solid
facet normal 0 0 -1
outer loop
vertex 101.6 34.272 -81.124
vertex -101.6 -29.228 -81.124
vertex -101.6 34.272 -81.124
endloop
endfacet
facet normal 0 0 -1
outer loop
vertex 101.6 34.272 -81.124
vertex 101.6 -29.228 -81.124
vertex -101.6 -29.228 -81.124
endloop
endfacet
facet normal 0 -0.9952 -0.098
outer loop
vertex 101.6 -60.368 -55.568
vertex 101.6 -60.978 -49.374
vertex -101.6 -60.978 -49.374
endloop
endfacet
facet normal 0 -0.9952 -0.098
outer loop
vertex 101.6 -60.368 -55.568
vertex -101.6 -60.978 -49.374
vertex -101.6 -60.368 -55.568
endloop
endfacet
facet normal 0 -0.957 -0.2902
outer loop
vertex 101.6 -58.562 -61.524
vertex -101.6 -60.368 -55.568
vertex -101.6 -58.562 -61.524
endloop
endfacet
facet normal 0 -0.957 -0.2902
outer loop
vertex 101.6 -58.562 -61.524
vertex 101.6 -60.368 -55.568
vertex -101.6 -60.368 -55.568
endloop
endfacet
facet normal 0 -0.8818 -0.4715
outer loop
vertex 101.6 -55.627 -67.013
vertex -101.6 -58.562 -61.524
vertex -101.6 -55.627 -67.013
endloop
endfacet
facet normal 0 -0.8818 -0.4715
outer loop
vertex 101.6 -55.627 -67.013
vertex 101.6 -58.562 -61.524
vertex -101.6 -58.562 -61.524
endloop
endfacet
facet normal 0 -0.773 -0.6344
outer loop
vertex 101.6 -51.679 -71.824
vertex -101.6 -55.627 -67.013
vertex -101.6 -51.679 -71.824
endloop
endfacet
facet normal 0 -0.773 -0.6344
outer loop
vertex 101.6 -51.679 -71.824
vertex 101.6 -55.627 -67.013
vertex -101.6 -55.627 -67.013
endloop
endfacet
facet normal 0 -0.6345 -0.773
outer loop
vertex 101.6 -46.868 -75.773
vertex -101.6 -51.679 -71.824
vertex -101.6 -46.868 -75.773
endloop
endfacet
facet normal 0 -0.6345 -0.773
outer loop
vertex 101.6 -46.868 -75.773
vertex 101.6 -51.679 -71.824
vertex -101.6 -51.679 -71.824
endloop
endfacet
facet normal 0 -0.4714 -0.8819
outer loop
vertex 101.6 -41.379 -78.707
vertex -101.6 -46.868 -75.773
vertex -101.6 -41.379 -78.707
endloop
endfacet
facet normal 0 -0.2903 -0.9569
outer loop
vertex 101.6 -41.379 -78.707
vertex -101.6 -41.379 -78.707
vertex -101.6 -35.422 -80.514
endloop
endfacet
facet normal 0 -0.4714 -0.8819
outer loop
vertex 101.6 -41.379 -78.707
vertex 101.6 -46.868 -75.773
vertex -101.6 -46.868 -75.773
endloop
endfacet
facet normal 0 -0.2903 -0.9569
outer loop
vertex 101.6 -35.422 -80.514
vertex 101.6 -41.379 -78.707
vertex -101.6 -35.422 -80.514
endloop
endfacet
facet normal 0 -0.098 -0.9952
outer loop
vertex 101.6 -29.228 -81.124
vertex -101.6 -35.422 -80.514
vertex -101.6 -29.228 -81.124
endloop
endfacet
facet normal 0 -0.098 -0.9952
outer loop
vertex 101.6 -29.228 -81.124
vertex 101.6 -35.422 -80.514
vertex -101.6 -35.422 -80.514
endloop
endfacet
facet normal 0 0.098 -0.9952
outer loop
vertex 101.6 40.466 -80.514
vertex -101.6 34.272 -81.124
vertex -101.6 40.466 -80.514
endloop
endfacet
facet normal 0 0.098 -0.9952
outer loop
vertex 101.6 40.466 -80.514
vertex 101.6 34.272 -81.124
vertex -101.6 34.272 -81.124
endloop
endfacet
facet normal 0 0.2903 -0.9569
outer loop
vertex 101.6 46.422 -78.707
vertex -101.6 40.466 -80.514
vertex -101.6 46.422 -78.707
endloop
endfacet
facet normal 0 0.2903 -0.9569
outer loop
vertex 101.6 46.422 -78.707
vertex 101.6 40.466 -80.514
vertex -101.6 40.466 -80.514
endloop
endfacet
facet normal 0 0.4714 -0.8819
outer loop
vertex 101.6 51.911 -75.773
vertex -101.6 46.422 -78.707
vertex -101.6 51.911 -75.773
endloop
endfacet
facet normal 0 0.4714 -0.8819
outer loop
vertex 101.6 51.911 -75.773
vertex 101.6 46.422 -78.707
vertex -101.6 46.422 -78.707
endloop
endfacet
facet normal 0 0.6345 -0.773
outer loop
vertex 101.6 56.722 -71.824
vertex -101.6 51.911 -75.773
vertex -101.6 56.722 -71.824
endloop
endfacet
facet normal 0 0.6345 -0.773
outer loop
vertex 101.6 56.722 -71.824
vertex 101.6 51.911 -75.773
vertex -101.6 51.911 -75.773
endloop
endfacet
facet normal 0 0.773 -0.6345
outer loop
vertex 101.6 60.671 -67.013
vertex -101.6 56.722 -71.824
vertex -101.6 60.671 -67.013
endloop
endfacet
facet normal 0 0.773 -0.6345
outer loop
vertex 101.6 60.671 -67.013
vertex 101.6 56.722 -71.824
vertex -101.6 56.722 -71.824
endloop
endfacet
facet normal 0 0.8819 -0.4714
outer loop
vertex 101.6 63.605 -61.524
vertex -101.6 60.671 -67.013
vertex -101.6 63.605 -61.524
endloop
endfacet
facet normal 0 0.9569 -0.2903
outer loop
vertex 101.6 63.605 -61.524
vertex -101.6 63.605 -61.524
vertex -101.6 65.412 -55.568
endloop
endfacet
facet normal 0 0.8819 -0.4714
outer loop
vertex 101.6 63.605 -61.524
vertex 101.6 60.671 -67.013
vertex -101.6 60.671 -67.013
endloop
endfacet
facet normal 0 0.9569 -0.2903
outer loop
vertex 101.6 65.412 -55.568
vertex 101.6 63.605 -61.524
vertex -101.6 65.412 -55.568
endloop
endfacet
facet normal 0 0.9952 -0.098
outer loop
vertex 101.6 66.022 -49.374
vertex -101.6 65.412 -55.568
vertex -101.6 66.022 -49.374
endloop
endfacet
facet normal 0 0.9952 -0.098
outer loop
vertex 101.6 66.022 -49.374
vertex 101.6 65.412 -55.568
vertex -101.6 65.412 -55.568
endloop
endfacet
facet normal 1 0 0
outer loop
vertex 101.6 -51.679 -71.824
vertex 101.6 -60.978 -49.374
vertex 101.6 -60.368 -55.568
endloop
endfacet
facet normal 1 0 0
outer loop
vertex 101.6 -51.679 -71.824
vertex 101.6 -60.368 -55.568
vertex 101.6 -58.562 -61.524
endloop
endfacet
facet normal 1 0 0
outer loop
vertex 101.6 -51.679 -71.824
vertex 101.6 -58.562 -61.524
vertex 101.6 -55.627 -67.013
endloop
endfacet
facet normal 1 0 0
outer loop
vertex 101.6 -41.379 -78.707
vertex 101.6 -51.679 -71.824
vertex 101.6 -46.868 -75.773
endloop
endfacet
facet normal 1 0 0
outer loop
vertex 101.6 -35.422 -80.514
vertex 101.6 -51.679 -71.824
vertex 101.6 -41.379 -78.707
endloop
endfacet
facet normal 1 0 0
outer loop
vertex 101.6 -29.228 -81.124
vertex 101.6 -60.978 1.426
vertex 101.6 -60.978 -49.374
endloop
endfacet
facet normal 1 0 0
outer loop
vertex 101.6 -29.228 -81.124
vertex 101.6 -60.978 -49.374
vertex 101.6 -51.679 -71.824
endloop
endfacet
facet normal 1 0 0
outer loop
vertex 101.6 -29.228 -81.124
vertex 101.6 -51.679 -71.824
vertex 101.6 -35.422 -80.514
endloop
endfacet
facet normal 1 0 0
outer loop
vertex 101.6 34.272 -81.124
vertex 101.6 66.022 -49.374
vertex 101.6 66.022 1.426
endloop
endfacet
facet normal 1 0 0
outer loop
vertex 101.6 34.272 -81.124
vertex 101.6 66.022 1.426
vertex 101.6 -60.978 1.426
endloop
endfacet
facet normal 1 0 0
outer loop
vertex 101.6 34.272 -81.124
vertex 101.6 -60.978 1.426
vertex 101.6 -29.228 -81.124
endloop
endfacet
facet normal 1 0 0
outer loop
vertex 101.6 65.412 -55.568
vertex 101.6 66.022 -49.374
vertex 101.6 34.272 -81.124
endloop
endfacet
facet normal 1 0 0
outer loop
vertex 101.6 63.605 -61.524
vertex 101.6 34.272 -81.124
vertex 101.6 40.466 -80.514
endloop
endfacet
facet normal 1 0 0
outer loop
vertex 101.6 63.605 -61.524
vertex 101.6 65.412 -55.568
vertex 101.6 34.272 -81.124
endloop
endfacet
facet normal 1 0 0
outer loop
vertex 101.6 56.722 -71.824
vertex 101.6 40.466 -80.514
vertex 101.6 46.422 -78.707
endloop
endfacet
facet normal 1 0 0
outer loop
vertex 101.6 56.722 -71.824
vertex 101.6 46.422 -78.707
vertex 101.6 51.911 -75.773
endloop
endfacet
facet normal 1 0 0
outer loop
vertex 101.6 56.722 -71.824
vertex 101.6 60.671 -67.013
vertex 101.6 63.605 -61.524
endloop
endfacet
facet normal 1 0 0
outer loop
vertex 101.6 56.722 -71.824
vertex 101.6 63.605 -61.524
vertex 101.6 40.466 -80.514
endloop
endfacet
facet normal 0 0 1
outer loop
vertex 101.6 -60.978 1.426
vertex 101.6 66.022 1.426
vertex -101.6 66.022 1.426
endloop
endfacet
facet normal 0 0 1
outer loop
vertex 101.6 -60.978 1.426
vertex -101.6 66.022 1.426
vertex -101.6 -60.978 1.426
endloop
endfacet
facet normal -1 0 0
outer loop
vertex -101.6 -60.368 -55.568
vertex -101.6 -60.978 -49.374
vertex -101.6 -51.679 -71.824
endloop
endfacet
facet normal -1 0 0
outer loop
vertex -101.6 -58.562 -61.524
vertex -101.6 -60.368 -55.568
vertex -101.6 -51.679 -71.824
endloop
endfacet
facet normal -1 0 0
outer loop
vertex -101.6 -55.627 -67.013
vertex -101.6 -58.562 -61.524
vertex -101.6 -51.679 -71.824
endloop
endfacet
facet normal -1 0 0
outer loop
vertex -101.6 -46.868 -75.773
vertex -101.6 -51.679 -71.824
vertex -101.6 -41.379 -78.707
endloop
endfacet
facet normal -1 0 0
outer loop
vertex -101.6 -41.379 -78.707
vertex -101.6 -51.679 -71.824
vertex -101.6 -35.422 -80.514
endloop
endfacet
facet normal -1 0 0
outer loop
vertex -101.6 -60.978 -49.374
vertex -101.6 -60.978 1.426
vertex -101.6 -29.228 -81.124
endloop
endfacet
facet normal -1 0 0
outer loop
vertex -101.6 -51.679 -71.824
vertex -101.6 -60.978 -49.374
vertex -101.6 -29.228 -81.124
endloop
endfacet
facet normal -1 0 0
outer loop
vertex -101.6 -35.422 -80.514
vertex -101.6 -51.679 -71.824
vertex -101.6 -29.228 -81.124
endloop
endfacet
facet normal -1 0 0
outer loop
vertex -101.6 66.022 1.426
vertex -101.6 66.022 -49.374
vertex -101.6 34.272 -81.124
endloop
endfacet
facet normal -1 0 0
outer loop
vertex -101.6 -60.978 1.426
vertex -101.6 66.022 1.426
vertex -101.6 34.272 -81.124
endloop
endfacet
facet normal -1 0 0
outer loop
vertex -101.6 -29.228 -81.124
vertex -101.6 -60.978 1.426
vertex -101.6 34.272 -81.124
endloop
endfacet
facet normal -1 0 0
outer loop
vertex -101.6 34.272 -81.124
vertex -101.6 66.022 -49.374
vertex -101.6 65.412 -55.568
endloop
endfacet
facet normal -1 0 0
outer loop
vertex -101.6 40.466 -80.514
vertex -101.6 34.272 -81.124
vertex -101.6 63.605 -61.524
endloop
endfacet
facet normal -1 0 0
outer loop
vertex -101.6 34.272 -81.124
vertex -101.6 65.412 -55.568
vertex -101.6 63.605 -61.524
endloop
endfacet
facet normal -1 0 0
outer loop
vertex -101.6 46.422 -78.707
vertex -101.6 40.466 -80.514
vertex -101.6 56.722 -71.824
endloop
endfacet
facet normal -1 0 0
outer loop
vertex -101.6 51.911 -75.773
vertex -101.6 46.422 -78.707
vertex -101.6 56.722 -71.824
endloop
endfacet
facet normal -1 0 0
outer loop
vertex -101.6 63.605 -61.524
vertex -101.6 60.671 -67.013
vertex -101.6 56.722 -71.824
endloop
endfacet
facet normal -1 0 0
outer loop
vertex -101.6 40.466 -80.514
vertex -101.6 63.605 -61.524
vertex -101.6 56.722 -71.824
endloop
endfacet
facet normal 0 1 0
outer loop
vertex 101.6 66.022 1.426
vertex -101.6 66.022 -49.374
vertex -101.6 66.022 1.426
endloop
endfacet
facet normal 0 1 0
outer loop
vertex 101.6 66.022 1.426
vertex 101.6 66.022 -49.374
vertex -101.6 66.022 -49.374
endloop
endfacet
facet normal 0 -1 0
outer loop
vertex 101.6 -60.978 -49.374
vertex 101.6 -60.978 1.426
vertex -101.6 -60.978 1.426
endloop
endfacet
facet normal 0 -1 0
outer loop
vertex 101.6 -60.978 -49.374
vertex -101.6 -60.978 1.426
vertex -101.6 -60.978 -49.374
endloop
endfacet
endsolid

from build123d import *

# Parameters (mm, degrees)
BOSS_EXTRUDE1_DEPTH = 101.6


with BuildPart() as part:
    # Sketch1 → Boss-Extrude1 (new body, symmetric)
    with BuildSketch(Plane(origin=(0, 0, 0), x_dir=(0, 0, -1), z_dir=(1, 0, 0))):
        with BuildLine():
            Line((49.373646209, 66.02166065), (-1.426353791, 66.02166065))
            Line((-1.426353791, 66.02166065), (-1.426353791, -60.97833935))
            Line((-1.426353791, -60.97833935), (49.373646209, -60.97833935))
            ThreePointArc((49.373646209, -60.97833935), (71.824286512, -51.678979653), (81.123646209, -29.22833935))
            Line((81.123646209, -29.22833935), (81.123646209, 34.27166065))
            ThreePointArc((81.123646209, 34.27166065), (71.824286512, 56.722300952), (49.373646209, 66.02166065))
        make_face()
    extrude(amount=BOSS_EXTRUDE1_DEPTH, both=True)


solid = part.part
